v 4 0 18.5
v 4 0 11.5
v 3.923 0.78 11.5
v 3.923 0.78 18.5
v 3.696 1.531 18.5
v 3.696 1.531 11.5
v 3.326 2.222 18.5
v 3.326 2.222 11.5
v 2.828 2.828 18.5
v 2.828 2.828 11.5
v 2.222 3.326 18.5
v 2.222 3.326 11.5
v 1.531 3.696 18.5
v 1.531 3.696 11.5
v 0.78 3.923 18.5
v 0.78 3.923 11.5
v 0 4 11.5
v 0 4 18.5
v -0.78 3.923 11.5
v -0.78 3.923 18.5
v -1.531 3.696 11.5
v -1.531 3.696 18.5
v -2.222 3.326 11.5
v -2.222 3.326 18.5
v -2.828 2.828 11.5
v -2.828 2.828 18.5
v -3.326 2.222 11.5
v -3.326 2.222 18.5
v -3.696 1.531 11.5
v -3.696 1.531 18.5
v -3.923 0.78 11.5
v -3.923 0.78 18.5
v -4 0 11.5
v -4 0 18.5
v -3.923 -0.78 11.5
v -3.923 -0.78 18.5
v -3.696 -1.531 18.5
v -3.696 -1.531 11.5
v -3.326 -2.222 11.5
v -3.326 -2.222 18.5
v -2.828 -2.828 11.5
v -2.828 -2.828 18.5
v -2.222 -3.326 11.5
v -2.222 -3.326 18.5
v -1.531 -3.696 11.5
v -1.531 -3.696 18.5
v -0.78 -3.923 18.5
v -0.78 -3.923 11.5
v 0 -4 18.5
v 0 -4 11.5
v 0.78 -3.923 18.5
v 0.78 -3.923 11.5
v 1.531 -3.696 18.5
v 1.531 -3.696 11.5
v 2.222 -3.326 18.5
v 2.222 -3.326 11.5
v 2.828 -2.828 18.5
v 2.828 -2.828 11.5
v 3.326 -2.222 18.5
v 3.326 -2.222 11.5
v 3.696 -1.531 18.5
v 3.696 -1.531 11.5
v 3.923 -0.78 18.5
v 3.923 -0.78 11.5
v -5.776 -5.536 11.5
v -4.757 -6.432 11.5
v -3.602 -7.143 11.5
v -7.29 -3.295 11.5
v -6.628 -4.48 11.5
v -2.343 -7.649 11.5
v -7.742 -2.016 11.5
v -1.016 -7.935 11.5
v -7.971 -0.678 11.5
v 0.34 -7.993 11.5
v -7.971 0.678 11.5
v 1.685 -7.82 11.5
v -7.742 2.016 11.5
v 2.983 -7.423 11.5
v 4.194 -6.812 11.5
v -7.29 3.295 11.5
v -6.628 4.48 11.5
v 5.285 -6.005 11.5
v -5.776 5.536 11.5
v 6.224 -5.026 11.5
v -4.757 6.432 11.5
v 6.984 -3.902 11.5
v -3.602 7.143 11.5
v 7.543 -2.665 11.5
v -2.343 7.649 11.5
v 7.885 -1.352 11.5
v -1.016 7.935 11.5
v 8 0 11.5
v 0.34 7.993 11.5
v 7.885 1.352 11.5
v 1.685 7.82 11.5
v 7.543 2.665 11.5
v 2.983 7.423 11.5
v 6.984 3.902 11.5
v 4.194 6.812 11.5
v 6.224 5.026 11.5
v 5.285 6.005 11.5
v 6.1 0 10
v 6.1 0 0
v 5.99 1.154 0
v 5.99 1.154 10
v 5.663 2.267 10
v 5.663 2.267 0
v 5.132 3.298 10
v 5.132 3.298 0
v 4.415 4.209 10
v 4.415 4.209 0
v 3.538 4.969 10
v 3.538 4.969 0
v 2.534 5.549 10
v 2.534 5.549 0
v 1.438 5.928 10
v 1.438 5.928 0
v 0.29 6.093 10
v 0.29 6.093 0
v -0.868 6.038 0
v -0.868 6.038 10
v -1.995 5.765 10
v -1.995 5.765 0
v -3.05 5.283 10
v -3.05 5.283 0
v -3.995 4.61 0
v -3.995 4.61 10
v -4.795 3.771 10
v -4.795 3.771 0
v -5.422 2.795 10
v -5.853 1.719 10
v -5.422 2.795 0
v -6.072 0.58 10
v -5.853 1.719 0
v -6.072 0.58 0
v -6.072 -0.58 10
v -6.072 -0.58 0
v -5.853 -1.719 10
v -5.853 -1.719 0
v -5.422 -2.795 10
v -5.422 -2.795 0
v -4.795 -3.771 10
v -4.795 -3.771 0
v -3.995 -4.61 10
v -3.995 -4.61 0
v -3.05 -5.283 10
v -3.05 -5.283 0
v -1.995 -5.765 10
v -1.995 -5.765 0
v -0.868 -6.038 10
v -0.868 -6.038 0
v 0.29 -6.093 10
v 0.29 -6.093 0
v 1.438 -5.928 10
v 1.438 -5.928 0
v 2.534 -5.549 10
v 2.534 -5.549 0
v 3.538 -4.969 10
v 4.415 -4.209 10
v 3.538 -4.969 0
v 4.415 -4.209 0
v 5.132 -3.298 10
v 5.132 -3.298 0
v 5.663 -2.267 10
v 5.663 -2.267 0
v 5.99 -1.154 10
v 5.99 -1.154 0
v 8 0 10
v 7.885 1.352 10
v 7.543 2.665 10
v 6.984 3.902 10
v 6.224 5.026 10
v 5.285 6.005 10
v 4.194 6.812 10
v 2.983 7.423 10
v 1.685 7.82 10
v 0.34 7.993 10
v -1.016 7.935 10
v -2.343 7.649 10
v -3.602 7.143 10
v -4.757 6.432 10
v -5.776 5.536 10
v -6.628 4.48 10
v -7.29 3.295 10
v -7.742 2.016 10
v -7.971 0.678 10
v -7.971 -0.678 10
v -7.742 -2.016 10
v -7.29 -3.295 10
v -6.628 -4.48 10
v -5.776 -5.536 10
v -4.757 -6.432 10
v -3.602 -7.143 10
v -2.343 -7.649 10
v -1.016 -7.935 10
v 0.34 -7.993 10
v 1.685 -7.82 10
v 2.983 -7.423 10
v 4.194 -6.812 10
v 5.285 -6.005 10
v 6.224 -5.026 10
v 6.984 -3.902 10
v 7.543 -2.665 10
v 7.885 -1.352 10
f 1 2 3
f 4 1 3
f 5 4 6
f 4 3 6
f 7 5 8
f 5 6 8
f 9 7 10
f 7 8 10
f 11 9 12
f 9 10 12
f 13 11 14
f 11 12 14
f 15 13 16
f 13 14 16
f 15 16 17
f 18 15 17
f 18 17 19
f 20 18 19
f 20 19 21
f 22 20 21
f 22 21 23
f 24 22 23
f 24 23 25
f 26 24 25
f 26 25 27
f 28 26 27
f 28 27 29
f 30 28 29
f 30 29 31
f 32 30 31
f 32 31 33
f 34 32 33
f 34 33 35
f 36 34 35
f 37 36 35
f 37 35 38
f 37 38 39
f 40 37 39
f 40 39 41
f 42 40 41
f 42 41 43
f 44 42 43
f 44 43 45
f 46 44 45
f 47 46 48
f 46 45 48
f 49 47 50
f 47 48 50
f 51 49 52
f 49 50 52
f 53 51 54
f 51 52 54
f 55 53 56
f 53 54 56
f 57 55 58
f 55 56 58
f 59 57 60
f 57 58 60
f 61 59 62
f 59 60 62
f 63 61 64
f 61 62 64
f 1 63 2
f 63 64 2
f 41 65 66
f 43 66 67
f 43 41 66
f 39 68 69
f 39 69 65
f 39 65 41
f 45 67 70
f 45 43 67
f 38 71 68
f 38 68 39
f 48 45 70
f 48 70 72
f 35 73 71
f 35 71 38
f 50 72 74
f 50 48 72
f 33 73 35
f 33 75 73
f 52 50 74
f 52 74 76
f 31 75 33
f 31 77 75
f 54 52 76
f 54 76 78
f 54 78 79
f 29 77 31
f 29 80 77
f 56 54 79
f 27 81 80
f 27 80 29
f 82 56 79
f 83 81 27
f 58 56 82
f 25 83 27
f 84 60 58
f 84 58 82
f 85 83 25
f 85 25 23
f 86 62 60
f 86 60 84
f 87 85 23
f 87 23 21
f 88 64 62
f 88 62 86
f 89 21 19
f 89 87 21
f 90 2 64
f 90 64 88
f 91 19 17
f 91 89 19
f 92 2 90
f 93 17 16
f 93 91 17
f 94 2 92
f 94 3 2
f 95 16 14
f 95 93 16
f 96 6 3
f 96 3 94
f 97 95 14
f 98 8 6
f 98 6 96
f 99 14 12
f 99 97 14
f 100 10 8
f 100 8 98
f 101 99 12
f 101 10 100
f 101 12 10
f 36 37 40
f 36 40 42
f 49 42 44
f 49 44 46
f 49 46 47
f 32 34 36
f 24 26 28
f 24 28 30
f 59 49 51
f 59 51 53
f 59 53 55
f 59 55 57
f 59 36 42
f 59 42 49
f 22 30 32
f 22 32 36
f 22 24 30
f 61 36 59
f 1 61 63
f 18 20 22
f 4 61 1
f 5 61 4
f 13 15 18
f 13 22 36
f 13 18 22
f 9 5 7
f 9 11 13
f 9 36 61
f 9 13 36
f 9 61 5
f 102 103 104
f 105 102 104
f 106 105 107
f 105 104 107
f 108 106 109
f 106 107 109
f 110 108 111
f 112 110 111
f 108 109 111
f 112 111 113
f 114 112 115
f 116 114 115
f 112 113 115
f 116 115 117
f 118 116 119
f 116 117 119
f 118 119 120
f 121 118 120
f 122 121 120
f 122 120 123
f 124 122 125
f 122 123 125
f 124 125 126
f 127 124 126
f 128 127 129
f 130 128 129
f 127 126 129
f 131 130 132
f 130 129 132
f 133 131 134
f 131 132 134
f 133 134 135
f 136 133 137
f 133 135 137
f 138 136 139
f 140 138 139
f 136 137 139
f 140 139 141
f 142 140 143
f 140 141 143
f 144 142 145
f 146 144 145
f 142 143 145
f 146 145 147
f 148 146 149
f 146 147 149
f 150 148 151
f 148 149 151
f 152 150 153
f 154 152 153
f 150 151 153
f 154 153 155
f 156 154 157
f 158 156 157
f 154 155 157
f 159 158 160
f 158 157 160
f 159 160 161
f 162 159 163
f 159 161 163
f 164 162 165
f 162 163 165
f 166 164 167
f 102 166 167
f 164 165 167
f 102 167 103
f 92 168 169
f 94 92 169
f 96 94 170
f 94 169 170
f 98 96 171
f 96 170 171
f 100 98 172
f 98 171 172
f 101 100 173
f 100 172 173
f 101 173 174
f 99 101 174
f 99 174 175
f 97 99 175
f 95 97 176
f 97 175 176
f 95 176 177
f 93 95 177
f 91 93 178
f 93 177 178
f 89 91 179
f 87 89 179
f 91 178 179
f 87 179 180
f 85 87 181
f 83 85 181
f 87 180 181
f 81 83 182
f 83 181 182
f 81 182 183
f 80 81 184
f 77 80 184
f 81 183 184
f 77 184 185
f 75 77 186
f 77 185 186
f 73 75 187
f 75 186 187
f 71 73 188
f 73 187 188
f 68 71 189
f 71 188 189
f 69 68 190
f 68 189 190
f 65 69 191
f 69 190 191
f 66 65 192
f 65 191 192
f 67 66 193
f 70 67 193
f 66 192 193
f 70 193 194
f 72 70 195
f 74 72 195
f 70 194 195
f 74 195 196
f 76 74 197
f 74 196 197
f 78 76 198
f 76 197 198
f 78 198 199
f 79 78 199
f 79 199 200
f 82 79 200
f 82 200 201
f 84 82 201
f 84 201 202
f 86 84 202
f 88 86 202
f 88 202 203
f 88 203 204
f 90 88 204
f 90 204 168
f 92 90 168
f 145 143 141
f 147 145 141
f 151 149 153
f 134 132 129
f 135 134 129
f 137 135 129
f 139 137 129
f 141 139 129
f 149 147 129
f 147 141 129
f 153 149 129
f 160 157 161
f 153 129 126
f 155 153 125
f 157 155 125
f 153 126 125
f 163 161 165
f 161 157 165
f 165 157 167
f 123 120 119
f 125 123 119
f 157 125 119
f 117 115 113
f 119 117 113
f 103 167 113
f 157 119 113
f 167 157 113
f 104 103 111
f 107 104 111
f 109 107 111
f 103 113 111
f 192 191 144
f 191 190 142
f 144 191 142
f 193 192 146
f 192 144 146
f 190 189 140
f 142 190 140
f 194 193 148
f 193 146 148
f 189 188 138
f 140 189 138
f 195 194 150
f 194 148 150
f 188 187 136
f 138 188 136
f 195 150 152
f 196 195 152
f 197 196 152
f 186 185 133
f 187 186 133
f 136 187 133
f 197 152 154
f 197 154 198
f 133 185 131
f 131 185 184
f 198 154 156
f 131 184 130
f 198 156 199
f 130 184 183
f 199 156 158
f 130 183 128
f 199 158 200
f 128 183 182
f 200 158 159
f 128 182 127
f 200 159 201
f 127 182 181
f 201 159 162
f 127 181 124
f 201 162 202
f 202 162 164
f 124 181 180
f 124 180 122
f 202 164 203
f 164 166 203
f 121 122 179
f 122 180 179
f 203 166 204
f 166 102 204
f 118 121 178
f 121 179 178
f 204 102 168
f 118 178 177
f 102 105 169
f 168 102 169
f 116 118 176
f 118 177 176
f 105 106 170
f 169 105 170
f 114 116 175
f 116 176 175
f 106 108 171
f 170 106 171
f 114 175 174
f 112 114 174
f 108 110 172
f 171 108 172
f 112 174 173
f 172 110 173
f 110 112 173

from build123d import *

# Parameters (mm, degrees)
F0_R     = 6.1
F0_R_2   = 4
F1_DEPTH = 10
F2_DEPTH = 18.5
F3_R     = 8
F4_DEPTH = 1.5


with BuildPart() as f1:
    # F0 (on Top) → F1 (new body)
    with BuildSketch(Plane.XY):
        Circle(F0_R)
        Circle(F0_R_2, mode=Mode.SUBTRACT)
    extrude(amount=F1_DEPTH)

    # F0 (on Top) → F2 (join)
    with BuildSketch(Plane.XY):
        Circle(F0_R_2)
    extrude(amount=F2_DEPTH)

    # F3 (on face) → F4 (join)
    with BuildSketch(Plane.XY.offset(10)):
        Circle(F3_R)
    extrude(amount=F4_DEPTH)


solid = f1.part
